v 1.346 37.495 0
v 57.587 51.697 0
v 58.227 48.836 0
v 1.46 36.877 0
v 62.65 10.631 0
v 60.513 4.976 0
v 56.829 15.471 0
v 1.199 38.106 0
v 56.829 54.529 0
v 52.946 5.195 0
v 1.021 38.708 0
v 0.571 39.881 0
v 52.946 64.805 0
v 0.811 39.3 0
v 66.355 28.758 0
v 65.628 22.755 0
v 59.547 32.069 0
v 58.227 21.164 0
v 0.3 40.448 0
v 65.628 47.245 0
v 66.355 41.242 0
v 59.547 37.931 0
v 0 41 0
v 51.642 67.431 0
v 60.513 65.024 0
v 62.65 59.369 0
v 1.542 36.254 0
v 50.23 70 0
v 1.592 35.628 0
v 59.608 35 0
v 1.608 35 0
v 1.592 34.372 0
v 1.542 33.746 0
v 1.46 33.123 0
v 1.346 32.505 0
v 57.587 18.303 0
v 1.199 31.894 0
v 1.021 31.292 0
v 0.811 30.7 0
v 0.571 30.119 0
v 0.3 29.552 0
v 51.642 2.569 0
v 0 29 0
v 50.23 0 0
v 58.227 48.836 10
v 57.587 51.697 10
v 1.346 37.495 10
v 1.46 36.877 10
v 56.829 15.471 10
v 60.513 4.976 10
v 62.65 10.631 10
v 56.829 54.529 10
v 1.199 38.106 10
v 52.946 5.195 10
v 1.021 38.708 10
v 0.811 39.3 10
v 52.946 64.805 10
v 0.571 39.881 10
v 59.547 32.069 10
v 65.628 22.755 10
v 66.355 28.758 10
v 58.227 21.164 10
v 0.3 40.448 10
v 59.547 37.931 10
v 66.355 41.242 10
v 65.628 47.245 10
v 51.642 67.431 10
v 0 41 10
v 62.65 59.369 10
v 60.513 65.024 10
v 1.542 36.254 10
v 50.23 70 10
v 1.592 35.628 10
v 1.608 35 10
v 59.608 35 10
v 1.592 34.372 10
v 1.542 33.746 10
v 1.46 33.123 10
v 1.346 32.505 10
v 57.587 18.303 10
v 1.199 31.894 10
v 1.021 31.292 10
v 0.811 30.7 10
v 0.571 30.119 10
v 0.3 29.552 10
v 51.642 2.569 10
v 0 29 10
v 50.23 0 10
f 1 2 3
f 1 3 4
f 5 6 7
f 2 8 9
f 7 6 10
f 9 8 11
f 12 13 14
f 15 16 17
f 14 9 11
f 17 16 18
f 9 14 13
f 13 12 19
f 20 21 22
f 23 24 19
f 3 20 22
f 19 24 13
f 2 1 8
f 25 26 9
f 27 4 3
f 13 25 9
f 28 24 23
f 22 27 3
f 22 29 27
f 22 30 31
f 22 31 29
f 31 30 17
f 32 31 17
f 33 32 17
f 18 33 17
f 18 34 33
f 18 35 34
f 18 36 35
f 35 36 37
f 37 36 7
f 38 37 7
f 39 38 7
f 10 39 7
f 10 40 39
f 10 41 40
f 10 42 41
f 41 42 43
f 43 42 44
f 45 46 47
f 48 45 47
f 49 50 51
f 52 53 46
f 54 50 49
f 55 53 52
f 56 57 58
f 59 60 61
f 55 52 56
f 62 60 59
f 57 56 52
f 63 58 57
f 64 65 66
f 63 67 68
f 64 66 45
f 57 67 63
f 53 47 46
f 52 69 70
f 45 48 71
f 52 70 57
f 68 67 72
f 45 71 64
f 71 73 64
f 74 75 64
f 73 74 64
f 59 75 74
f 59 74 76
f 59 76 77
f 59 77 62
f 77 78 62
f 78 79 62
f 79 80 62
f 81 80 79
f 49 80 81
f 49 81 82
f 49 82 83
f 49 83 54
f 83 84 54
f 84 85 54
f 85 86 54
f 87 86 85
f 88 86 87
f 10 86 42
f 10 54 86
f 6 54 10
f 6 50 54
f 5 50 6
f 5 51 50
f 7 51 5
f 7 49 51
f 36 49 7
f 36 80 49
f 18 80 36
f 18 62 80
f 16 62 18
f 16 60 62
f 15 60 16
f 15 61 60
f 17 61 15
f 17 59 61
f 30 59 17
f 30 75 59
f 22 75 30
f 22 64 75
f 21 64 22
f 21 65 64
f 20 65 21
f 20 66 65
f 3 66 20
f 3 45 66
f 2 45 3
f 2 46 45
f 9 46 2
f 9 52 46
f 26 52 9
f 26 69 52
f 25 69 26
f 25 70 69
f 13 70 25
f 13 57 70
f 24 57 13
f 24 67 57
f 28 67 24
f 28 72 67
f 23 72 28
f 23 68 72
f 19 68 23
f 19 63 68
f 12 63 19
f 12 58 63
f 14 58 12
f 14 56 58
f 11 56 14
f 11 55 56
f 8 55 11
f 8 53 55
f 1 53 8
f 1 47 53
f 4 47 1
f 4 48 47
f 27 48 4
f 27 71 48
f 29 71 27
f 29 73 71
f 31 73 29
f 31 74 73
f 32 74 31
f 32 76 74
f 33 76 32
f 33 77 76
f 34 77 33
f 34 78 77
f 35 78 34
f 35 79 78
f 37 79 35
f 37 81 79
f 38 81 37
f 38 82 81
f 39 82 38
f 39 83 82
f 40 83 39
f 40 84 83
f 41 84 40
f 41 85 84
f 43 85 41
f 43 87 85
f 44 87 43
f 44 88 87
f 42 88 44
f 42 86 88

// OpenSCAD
$fn = 32;

// ----------------------------------------------------------------------
// Gear sector: 4 teeth on 60 degrees
// ----------------------------------------------------------------------

// --- parameters (mm) ---
sector_angle = 60;        // sector angle, degrees
root_r = 70;              // root circle radius
tooth_h = 7;              // tooth height over the root circle
teeth = 4;                // number of teeth on the sector
hub_r = 12;               // hub bore radius
plate_t = 10;             // sector thickness, Z
arc_step = 3;             // sampling step of the root/hub arcs, degrees

tip_r = root_r + tooth_h;  // tip circle radius

profile = [[50.23, 0], [51.642, 2.569], [52.946, 5.195], [60.513, 4.976], [62.65, 10.631], [56.829, 15.471], [57.587, 18.303], [58.227, 21.164], [65.628, 22.755], [66.355, 28.758], [59.547, 32.069], [59.608, 35], [59.547, 37.931], [66.355, 41.242], [65.628, 47.245], [58.227, 48.836], [57.587, 51.697], [56.829, 54.529], [62.65, 59.369], [60.513, 65.024], [52.946, 64.805], [51.642, 67.431], [50.23, 70], [0, 41], [0.3, 40.448], [0.571, 39.881], [0.811, 39.3], [1.021, 38.708], [1.199, 38.106], [1.346, 37.495], [1.46, 36.877], [1.542, 36.254], [1.592, 35.628], [1.608, 35], [1.592, 34.372], [1.542, 33.746], [1.46, 33.123], [1.346, 32.505], [1.199, 31.894], [1.021, 31.292], [0.811, 30.7], [0.571, 30.119], [0.3, 29.552], [0, 29]];  // primary outline, 44 points, counter clockwise

// --- the one profile operation ---
linear_extrude(height = plate_t) polygon(points = profile);
